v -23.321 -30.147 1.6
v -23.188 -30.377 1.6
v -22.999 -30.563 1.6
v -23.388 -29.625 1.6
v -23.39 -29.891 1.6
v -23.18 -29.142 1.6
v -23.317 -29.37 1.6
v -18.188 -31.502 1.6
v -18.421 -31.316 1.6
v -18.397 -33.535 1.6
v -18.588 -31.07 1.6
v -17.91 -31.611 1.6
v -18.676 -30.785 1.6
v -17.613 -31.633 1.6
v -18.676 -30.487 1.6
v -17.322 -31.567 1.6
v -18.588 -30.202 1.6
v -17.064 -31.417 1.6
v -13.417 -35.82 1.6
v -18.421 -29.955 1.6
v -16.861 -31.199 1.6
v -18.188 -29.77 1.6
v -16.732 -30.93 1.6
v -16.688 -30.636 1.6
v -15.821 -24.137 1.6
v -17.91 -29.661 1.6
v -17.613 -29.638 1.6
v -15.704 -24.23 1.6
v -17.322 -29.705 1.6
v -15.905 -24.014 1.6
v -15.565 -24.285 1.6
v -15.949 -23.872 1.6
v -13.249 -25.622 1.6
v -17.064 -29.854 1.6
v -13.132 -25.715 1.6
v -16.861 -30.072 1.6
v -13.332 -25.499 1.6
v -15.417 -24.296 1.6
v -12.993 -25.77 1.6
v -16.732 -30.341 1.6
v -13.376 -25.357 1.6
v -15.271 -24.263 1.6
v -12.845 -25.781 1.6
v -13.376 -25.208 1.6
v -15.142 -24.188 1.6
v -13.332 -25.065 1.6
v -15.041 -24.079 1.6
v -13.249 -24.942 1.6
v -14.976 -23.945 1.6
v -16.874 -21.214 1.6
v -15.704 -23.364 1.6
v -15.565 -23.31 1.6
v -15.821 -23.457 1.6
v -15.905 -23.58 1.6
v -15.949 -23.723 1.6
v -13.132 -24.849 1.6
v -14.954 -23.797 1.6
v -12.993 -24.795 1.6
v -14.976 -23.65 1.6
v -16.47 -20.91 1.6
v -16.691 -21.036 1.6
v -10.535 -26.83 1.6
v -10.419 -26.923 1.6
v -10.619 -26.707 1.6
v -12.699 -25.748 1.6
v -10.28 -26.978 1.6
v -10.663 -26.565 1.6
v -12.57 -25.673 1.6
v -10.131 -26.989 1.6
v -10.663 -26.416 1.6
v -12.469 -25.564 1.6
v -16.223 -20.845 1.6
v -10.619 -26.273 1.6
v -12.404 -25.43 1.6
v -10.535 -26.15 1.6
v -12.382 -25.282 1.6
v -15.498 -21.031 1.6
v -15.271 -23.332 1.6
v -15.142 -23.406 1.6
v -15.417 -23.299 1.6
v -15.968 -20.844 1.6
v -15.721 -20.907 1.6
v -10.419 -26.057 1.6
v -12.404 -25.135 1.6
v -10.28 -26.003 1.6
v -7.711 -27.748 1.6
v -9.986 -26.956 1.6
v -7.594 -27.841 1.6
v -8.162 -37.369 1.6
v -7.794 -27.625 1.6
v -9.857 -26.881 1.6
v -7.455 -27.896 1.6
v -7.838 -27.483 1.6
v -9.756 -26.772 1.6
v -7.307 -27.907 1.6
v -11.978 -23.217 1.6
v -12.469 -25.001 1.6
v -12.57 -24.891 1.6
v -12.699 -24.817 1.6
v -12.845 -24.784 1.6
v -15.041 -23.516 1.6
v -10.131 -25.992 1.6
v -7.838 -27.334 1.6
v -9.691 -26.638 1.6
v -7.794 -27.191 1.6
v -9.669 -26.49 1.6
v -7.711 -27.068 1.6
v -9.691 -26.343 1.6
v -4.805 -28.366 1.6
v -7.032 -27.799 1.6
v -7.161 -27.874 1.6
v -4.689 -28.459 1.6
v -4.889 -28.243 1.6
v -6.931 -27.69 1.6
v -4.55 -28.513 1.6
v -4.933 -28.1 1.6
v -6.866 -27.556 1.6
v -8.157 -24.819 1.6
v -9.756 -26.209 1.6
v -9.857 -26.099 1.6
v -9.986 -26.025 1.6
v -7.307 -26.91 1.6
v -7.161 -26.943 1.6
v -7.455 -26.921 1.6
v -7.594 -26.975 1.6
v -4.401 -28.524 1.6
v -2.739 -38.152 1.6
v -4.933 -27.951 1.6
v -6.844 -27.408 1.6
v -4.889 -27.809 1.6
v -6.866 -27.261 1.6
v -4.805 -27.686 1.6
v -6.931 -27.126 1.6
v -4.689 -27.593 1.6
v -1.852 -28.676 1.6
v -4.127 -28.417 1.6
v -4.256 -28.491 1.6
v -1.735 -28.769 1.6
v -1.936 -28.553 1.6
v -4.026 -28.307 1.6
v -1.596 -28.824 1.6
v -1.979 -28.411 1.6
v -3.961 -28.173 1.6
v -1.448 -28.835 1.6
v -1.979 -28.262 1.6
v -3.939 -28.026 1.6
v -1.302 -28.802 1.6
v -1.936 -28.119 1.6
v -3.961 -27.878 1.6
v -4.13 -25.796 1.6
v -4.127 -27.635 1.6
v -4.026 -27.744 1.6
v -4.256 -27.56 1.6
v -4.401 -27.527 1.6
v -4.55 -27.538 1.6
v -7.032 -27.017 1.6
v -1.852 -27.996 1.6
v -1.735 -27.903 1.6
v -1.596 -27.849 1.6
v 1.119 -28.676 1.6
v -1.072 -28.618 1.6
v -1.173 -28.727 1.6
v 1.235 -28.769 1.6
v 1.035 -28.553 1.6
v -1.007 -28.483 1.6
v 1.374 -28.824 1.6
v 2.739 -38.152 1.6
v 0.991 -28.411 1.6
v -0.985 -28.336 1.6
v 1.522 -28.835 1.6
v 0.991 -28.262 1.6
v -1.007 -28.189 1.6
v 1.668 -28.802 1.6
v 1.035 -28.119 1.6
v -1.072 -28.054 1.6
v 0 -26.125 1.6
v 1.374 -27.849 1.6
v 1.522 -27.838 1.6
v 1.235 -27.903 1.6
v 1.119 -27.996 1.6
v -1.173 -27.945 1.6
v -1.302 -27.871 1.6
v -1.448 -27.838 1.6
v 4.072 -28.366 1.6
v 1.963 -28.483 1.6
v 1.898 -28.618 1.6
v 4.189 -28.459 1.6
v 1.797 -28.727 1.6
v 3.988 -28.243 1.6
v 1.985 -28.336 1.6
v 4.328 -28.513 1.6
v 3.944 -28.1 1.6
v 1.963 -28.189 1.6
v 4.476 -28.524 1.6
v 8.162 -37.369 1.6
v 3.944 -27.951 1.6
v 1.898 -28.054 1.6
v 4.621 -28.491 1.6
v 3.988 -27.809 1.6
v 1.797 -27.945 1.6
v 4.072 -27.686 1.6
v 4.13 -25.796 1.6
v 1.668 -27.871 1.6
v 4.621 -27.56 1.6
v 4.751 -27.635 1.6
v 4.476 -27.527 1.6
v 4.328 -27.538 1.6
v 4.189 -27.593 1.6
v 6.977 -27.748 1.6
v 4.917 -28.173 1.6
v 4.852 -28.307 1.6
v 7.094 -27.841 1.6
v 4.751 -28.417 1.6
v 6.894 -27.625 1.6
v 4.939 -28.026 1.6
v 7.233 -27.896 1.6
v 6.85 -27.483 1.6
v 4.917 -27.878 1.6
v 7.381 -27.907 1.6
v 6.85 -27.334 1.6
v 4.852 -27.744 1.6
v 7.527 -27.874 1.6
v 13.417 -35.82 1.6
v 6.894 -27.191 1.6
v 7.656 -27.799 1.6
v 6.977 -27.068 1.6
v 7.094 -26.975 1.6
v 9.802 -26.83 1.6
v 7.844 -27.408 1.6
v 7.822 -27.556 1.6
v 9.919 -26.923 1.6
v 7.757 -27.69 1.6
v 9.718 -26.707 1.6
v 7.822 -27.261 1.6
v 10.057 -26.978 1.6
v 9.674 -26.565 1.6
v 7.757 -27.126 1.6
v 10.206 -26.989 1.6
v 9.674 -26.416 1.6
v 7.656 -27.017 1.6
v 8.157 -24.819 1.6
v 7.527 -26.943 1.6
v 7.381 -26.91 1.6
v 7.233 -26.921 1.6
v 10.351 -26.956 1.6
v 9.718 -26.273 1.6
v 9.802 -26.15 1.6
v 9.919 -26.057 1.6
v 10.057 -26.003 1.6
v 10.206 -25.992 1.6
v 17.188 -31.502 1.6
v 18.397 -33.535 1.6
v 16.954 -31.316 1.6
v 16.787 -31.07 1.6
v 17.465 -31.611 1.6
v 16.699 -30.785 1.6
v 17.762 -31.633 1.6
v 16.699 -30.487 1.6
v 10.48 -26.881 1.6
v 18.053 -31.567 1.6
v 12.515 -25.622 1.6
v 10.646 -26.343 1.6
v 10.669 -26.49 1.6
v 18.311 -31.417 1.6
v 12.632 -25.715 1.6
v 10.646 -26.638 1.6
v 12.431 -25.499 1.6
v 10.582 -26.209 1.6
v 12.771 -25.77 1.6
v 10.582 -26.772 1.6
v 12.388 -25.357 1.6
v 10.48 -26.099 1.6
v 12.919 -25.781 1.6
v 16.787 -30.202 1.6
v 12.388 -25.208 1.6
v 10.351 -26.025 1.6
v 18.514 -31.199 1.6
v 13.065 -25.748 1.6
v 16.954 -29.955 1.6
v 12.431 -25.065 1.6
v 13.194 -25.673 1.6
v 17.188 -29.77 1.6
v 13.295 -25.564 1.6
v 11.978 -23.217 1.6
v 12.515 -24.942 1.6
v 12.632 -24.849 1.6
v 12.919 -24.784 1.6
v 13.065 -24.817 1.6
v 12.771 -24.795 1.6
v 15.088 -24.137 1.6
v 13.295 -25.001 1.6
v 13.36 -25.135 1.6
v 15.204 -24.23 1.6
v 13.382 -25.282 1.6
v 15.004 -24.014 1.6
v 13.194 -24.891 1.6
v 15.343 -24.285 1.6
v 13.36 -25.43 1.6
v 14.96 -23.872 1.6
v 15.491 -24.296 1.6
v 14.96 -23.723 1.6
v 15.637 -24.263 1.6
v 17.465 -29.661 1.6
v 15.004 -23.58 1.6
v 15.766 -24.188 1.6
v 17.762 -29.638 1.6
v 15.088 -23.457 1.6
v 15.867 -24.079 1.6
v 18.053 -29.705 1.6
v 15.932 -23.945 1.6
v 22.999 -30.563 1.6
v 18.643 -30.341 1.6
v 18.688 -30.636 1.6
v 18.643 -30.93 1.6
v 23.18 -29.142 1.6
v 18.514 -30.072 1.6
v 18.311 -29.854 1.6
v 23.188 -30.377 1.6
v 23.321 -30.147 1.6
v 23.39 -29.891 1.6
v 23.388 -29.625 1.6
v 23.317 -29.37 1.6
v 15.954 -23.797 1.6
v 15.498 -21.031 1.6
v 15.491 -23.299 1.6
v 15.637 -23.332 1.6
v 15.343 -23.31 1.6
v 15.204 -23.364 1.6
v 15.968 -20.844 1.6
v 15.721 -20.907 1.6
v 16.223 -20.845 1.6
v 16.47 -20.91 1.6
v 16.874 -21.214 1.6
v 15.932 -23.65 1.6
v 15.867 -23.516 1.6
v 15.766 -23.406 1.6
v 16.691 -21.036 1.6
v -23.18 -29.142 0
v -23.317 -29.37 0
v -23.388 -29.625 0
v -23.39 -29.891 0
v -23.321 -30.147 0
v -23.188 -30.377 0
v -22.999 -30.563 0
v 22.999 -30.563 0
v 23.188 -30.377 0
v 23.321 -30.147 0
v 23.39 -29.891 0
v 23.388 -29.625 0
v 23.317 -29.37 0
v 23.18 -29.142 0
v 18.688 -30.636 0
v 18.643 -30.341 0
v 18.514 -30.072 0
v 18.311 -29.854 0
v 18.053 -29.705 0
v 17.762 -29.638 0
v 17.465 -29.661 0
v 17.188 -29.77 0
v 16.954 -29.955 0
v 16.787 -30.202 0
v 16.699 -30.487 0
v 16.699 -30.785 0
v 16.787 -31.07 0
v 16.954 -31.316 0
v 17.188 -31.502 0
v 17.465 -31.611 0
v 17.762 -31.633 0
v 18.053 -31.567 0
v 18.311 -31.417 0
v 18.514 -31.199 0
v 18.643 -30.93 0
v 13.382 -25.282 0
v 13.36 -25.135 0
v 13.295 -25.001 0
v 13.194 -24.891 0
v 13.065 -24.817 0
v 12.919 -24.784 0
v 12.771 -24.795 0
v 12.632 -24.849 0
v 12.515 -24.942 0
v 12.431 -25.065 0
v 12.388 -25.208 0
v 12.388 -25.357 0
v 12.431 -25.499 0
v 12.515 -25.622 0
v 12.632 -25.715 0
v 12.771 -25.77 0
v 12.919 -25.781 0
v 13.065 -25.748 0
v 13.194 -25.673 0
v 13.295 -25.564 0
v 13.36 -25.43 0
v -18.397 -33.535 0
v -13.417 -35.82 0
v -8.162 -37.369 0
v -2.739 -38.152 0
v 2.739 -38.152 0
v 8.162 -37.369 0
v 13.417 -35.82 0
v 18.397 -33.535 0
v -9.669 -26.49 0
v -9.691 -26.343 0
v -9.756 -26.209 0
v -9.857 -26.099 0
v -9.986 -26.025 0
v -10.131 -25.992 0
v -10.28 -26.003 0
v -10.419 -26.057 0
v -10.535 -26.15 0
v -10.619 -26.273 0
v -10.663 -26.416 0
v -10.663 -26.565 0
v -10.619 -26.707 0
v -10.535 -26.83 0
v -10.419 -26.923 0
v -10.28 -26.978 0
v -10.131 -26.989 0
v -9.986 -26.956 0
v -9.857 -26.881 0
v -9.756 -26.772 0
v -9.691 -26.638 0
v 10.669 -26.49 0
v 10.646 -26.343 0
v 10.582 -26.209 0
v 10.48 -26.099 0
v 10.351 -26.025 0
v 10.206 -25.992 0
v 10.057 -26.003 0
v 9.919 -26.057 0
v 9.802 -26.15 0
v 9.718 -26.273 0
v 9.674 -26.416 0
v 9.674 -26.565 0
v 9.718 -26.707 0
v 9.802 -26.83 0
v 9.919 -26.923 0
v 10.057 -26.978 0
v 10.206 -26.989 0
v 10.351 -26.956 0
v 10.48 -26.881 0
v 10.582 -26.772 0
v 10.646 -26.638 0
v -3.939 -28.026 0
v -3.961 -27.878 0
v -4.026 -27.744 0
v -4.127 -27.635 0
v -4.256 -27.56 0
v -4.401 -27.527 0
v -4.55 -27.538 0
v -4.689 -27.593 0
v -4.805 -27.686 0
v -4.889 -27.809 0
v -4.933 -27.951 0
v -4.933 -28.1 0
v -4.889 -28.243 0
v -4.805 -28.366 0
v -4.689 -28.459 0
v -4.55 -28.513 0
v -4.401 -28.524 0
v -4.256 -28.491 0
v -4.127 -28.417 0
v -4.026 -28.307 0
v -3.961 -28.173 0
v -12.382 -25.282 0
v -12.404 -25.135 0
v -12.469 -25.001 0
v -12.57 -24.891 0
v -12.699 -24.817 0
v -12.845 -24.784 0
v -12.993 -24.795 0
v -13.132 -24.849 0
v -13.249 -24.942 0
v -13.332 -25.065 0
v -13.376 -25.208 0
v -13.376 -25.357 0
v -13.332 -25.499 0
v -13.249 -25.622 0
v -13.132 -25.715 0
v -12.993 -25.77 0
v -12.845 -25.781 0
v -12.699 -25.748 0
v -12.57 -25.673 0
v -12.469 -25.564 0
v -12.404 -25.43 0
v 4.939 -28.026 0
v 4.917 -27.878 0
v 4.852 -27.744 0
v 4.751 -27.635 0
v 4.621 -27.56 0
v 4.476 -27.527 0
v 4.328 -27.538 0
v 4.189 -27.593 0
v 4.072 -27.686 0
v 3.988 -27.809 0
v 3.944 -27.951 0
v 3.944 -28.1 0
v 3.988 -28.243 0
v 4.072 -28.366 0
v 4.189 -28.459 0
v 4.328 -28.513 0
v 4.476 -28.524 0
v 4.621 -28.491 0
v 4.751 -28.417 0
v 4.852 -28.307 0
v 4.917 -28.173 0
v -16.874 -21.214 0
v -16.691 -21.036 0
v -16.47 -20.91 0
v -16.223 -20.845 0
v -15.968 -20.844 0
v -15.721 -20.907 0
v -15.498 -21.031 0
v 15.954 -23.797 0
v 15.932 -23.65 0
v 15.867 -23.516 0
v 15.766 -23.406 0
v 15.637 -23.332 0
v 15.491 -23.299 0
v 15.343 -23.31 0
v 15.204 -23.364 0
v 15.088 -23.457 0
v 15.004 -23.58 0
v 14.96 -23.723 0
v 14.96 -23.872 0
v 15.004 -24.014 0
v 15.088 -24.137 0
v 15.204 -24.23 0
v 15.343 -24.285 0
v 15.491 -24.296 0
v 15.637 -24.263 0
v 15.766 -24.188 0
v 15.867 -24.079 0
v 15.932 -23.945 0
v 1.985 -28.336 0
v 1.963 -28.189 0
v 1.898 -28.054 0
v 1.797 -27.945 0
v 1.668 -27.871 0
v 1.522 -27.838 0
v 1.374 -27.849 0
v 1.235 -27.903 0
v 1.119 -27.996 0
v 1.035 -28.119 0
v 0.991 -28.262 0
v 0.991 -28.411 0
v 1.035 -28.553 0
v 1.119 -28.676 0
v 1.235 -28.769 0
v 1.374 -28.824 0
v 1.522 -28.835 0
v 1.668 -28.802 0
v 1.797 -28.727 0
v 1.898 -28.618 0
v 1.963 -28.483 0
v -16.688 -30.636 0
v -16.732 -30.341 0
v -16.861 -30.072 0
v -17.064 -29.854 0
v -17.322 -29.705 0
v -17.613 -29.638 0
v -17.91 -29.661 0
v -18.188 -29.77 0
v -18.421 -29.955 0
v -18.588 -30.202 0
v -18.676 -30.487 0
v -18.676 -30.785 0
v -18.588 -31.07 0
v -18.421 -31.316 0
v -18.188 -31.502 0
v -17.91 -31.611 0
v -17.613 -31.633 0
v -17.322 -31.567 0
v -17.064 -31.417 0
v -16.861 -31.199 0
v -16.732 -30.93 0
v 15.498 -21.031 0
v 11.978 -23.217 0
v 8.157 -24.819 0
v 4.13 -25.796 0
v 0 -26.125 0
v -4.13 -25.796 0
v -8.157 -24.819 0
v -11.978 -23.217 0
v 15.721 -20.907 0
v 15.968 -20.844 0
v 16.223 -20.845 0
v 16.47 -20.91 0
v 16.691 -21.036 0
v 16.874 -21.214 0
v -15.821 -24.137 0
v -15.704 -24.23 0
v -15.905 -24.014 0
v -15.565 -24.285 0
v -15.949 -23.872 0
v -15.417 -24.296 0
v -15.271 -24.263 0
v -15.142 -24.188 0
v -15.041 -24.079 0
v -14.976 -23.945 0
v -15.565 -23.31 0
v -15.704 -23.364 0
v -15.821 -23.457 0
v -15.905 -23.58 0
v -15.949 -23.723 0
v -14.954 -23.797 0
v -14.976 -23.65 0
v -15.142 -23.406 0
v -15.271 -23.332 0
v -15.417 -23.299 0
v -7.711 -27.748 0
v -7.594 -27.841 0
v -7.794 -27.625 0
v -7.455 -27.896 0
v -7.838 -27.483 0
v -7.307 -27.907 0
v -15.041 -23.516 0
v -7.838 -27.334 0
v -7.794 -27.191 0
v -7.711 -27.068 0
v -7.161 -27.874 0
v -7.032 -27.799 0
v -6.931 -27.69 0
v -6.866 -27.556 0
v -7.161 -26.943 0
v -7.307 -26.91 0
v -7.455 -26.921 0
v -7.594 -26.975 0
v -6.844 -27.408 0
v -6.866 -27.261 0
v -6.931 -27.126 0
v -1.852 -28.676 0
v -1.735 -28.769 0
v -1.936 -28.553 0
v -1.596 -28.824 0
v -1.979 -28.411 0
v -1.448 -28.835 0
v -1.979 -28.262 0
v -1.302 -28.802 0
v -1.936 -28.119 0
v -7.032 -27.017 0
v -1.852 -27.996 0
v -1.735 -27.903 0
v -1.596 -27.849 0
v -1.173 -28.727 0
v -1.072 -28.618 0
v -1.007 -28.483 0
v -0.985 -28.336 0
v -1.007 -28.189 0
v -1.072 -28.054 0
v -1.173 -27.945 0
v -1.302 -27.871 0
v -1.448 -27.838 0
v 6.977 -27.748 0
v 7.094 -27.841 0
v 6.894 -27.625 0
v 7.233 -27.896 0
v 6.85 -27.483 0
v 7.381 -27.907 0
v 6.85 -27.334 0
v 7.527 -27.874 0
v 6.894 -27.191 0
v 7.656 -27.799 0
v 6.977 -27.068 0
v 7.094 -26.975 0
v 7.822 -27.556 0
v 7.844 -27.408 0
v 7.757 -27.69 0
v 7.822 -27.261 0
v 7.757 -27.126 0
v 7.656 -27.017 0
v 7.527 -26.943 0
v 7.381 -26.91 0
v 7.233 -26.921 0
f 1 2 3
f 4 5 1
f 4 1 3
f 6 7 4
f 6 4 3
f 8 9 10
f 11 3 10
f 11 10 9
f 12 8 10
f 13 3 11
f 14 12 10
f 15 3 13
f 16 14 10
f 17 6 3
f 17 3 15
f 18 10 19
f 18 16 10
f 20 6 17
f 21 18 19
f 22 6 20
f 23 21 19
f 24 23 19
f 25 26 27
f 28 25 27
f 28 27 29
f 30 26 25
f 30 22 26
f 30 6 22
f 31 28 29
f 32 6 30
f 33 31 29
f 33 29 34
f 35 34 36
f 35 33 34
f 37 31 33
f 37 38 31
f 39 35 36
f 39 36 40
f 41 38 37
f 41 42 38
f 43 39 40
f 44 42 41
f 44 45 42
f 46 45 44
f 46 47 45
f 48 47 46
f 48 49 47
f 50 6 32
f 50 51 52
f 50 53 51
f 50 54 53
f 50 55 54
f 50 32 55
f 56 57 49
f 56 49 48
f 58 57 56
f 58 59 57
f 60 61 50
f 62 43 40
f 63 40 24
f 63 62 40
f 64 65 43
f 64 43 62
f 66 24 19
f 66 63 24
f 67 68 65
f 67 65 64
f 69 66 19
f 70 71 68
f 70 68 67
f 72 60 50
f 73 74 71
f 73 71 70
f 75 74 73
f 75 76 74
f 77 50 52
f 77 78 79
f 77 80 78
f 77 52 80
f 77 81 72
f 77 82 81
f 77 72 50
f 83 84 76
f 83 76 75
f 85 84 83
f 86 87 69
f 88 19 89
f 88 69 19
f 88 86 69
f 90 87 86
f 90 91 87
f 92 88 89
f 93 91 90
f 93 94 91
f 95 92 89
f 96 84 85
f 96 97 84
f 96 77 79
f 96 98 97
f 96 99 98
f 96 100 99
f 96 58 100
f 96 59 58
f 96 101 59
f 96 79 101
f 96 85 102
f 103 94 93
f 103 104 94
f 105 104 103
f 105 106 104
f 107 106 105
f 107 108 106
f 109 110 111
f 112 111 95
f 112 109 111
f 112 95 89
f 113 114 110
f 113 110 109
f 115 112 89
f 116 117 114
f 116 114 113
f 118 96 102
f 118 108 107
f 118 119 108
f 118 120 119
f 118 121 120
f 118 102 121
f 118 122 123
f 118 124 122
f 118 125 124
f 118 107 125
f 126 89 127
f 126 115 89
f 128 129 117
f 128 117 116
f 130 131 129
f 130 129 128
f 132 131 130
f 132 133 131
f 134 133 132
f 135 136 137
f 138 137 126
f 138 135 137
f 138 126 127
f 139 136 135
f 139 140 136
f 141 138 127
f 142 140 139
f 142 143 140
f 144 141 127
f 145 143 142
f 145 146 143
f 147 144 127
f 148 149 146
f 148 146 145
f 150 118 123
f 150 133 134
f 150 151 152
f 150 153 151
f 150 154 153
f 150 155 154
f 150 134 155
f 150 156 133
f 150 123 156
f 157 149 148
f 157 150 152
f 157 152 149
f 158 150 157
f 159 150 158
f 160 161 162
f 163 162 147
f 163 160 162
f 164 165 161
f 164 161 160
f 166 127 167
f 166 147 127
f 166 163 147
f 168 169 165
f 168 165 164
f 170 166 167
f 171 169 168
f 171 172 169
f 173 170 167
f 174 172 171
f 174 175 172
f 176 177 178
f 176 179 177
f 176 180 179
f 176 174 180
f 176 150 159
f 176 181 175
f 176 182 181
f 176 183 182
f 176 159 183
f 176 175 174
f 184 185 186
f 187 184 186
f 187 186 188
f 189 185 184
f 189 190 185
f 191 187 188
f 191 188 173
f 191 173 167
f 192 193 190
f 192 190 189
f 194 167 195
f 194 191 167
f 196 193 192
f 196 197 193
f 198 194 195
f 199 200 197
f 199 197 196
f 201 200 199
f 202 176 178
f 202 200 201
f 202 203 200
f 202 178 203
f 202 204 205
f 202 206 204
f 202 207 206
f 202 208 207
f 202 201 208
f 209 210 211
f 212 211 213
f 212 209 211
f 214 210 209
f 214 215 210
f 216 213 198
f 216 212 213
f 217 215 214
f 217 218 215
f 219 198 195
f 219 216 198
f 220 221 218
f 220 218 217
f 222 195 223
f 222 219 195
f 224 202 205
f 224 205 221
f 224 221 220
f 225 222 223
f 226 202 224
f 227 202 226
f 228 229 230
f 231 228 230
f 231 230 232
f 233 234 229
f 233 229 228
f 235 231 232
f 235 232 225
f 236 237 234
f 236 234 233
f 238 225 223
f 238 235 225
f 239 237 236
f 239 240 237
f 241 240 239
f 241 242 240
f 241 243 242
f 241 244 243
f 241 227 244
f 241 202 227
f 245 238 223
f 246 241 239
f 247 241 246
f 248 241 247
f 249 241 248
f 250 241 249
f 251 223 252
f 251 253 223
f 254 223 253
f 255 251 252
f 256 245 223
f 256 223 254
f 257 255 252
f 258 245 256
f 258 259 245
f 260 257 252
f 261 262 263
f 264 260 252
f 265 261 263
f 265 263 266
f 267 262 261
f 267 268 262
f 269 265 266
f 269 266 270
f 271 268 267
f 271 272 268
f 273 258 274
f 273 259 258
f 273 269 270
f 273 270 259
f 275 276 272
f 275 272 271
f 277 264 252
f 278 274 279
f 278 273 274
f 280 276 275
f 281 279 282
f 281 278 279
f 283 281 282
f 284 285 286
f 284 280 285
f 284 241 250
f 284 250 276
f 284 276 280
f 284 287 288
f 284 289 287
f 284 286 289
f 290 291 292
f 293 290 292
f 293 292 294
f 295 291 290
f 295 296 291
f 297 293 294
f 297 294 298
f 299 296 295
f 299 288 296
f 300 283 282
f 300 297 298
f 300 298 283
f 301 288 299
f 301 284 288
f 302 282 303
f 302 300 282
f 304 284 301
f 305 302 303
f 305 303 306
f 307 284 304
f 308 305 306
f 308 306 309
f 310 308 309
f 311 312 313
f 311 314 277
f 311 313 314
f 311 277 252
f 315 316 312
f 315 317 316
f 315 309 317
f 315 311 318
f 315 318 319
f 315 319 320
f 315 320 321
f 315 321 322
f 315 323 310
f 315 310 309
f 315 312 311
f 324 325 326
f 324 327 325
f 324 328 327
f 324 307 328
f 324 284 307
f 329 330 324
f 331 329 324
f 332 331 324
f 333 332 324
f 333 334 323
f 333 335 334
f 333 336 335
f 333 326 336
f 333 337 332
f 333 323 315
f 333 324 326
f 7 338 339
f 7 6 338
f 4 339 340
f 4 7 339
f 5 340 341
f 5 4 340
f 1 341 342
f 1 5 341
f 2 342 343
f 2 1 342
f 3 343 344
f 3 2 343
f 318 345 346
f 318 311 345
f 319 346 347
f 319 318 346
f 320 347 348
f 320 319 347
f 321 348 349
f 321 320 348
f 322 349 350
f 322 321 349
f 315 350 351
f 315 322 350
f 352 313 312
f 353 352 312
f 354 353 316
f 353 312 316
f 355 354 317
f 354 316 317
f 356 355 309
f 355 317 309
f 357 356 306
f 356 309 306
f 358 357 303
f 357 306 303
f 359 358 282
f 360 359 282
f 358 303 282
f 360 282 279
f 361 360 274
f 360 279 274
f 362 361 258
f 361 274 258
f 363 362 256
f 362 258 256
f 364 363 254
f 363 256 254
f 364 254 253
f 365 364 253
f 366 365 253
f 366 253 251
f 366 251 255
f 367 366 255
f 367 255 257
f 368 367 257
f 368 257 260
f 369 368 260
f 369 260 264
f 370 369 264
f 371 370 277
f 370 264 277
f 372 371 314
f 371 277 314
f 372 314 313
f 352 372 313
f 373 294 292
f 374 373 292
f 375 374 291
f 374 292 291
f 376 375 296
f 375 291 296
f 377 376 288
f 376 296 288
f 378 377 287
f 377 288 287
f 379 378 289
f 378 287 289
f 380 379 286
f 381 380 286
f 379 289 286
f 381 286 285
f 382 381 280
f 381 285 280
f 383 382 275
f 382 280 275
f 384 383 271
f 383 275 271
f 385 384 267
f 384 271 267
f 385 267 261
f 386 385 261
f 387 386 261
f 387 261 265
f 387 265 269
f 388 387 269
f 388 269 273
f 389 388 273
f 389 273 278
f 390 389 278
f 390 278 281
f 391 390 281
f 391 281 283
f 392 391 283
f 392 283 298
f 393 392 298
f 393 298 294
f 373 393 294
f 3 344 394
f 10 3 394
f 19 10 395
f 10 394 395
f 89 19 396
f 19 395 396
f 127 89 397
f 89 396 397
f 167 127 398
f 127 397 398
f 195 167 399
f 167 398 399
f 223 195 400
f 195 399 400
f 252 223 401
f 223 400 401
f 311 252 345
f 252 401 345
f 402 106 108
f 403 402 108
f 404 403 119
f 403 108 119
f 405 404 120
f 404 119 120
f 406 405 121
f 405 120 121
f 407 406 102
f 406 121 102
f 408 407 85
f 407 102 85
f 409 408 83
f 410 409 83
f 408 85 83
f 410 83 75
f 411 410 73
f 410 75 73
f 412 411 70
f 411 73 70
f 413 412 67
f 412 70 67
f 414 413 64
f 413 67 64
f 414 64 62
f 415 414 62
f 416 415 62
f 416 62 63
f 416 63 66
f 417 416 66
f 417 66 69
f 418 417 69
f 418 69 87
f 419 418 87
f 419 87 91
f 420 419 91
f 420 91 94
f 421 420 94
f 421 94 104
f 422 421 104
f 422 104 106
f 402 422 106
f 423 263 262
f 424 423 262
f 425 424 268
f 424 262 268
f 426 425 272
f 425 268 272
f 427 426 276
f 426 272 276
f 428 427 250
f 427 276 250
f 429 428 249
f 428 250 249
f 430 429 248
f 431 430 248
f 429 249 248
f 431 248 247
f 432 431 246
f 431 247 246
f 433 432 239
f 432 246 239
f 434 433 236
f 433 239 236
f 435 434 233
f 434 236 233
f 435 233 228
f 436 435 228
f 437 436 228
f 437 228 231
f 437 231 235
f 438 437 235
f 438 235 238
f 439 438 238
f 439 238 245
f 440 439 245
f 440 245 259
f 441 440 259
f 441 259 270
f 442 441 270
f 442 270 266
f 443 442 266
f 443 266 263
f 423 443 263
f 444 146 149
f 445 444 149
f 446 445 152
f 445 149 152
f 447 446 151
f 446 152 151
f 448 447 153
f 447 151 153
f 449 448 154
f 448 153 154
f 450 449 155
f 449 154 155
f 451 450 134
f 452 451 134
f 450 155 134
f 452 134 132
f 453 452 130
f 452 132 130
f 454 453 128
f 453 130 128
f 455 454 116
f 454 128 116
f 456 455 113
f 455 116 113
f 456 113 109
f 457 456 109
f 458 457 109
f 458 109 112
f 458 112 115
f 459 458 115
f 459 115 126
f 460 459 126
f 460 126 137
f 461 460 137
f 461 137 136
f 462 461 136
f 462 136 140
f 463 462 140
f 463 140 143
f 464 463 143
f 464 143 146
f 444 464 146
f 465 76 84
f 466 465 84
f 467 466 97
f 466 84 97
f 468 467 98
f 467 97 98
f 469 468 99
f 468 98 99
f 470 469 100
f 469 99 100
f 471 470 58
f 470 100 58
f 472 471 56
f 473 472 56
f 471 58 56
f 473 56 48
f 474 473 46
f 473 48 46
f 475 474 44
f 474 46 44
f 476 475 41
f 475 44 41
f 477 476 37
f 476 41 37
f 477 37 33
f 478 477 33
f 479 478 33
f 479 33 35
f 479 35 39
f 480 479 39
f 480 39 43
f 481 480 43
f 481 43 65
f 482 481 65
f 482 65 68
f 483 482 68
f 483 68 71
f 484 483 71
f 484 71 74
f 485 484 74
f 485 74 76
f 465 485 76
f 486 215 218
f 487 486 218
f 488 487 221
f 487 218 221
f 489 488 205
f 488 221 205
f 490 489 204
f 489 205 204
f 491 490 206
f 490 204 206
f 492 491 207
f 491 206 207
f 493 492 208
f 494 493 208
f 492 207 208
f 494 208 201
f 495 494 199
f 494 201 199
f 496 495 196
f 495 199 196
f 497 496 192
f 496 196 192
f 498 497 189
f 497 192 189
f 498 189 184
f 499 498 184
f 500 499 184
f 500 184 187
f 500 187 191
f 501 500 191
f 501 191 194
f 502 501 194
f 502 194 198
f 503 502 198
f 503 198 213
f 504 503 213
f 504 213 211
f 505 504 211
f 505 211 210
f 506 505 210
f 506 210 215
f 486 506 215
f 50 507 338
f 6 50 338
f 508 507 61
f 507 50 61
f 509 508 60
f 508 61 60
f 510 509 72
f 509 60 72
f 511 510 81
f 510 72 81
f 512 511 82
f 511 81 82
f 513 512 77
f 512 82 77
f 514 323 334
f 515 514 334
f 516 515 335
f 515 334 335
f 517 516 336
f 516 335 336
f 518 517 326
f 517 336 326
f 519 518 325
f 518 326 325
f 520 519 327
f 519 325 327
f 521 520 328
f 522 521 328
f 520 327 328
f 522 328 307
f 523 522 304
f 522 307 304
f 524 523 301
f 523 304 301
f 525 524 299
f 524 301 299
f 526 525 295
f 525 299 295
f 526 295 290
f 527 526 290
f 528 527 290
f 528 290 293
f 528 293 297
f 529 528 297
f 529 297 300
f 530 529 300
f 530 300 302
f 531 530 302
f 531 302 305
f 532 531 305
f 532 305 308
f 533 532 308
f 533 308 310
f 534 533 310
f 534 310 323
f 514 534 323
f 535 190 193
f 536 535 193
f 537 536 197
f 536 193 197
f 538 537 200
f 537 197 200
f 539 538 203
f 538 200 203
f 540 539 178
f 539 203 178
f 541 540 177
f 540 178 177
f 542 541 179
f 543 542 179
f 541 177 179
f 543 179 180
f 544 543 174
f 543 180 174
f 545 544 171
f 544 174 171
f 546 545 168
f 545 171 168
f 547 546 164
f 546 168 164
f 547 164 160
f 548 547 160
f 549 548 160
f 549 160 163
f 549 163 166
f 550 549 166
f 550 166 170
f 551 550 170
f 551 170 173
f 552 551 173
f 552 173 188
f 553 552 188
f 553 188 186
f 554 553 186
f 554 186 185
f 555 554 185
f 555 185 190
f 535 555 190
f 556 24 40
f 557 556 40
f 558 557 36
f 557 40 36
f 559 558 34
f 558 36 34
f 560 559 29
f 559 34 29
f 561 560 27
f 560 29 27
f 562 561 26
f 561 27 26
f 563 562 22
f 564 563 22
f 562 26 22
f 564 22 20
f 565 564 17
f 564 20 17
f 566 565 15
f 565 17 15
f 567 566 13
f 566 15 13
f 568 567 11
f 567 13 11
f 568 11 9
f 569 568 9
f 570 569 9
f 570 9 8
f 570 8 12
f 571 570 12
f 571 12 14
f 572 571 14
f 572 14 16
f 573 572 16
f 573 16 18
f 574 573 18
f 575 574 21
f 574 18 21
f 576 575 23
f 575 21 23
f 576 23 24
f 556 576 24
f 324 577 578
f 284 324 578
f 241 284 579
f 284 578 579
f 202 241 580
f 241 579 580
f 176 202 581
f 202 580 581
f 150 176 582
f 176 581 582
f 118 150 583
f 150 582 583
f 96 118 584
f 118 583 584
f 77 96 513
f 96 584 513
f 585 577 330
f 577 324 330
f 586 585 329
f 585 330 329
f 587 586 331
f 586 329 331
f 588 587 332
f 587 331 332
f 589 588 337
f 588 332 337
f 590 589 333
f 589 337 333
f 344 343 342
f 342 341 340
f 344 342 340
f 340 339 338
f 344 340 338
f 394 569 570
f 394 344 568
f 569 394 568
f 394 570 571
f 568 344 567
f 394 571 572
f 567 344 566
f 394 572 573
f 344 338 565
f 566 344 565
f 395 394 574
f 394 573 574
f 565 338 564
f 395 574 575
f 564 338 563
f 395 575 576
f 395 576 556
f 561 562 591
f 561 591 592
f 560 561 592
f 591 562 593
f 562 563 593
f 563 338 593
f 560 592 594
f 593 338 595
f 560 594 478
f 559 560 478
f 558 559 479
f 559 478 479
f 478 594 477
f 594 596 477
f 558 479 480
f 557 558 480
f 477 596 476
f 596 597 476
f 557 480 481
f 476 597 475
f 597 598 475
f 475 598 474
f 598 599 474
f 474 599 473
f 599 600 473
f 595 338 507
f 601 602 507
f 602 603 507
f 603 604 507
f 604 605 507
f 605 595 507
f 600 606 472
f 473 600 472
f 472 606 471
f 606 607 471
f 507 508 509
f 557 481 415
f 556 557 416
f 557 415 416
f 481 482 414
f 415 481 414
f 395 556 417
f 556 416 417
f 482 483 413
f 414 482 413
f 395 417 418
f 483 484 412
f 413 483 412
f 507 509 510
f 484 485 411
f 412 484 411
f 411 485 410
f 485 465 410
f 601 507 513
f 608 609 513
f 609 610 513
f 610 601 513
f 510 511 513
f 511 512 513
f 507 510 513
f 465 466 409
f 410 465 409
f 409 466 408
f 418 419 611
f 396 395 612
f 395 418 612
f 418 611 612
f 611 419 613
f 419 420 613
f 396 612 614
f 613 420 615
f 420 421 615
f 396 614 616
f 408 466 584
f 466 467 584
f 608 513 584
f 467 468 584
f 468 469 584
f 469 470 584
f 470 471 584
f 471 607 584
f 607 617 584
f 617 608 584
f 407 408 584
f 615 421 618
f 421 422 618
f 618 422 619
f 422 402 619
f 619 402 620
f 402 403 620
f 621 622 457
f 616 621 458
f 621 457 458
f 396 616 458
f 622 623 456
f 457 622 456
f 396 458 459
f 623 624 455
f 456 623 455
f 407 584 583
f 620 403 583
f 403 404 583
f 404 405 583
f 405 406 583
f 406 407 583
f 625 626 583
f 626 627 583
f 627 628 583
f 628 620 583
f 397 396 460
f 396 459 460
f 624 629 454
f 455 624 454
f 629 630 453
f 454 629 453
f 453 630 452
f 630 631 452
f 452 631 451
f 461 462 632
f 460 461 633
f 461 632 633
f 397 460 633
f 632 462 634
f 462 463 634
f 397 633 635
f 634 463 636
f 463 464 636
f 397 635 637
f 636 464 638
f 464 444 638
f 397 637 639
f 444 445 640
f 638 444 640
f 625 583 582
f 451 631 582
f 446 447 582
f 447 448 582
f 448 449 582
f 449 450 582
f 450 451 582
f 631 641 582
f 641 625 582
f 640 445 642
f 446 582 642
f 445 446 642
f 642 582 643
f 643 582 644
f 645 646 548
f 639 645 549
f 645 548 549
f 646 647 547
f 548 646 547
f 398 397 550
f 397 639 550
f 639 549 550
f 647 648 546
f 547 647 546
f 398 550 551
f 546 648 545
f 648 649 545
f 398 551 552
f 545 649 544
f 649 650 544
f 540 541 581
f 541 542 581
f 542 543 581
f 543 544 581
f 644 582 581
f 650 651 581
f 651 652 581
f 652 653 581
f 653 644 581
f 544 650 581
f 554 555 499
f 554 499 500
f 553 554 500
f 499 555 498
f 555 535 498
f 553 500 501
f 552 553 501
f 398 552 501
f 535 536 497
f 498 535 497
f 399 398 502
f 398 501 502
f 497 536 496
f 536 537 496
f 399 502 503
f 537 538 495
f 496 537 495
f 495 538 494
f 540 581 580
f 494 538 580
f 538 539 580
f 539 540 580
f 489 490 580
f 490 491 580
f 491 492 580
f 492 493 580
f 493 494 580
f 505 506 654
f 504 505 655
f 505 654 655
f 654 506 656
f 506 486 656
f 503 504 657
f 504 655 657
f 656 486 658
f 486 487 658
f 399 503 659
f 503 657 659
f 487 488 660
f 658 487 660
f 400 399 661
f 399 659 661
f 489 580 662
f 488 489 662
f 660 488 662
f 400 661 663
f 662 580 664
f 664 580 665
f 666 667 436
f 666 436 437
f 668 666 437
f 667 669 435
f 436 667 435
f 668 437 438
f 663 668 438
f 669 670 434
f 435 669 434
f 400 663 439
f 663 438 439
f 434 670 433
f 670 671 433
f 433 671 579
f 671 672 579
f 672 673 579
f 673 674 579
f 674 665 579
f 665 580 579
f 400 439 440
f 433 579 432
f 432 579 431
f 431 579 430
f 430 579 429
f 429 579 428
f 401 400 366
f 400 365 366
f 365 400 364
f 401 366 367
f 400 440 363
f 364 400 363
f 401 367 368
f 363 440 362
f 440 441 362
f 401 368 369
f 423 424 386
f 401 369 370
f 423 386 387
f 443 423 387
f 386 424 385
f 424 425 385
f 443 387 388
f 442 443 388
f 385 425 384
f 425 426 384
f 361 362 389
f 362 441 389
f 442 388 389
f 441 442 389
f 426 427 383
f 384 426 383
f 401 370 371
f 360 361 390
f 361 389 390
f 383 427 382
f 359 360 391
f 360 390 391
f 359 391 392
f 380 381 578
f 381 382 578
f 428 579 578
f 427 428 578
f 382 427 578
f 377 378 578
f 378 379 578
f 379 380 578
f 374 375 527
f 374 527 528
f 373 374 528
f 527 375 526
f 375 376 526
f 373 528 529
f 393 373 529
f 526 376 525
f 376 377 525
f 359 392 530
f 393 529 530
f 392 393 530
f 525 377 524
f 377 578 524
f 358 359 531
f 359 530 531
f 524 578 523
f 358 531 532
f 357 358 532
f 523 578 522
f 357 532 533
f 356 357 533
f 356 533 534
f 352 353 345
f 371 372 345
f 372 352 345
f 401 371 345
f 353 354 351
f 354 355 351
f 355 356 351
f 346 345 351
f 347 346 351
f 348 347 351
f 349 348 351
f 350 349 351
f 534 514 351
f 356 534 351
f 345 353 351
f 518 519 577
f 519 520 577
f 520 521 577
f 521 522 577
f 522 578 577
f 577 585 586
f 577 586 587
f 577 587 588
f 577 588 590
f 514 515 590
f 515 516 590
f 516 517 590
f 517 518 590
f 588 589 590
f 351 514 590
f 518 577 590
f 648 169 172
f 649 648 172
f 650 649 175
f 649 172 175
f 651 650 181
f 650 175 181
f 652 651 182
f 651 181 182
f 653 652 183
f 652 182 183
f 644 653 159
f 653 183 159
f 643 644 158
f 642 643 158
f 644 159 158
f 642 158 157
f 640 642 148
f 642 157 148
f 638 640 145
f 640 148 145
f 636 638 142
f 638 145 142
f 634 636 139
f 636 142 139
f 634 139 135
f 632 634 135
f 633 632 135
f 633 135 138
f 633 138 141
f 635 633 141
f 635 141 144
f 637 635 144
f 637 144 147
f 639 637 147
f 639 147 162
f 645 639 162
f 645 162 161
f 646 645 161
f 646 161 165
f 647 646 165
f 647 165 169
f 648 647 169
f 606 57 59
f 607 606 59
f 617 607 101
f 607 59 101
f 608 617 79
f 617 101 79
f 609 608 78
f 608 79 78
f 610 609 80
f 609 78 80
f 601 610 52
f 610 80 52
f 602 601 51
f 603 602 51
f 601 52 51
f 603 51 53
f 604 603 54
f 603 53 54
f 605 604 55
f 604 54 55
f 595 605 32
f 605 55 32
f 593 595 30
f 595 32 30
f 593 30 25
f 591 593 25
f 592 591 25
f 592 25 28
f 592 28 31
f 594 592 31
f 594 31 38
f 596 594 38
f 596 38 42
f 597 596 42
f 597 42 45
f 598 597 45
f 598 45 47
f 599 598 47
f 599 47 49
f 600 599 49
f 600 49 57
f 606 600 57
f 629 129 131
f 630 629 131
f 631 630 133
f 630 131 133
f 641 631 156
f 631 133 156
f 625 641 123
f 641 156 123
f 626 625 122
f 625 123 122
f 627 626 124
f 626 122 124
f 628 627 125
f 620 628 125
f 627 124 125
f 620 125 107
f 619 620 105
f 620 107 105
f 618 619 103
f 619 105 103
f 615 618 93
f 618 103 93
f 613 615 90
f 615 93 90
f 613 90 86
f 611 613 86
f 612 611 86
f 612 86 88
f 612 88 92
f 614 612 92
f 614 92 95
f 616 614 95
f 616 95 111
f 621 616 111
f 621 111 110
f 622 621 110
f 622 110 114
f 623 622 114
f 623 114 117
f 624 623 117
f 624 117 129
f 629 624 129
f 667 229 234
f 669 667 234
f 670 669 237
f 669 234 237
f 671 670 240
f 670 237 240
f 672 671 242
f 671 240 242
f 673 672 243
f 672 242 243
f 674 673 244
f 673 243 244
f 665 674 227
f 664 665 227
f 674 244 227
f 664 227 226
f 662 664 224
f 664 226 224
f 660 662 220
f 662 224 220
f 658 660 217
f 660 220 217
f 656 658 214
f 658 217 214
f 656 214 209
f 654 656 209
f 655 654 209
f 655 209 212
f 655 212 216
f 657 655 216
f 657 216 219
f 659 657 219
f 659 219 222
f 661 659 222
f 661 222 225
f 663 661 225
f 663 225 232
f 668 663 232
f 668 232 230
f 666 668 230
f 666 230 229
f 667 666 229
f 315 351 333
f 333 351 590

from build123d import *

# Parameters (mm, degrees)
BOSS_EXTRUDE2_DEPTH = 1.6
CUT_EXTRUDE3_START  = 1.6
SKETCH1_R           = 0.5
CUT_EXTRUDE3_DEPTH  = 47.684310176
CUT_EXTRUDE4_START  = 1.6
SKETCH3_R           = 1
CUT_EXTRUDE4_DEPTH  = 1.6
FILLET1_R           = 1


with BuildPart() as part:
    # Sketch2 → Boss-Extrude2 (new body)
    with BuildSketch(Plane.XY):
        with BuildLine():
            Line((-16.263194882, -20.445638098), (-23.811184851, -29.934762))
            ThreePointArc((-23.811184851, -29.934762), (0, -38.25), (23.811184851, -29.934762))
            Line((23.811184851, -29.934762), (16.263194882, -20.445638098))
            ThreePointArc((16.263194882, -20.445638098), (0, -26.125), (-16.263194882, -20.445638098))
        make_face()
    extrude(amount=BOSS_EXTRUDE2_DEPTH)

    # Sketch1 → Cut-Extrude3 (cut, through all)
    with BuildSketch(Plane.XY.offset(CUT_EXTRUDE3_START)):
        with Locations((-15.454132619, -23.797277365)):
            Circle(SKETCH1_R)
        with Locations((-12.88198043, -25.282310124)):
            Circle(SKETCH1_R)
        with Locations((-10.168690568, -26.490344602)):
            Circle(SKETCH1_R)
        with Locations((-7.343990405, -27.408145321)):
            Circle(SKETCH1_R)
        with Locations((-4.438827946, -28.025656664)):
            Circle(SKETCH1_R)
        with Locations((-1.485032758, -28.336113049)):
            Circle(SKETCH1_R)
        with Locations((1.485032758, -28.336113049)):
            Circle(SKETCH1_R)
        with Locations((4.438827946, -28.025656664)):
            Circle(SKETCH1_R)
        with Locations((7.343990405, -27.408145321)):
            Circle(SKETCH1_R)
        with Locations((10.168690568, -26.490344602)):
            Circle(SKETCH1_R)
        with Locations((12.88198043, -25.282310124)):
            Circle(SKETCH1_R)
        with Locations((15.454132619, -23.797277365)):
            Circle(SKETCH1_R)
    extrude(amount=-CUT_EXTRUDE3_DEPTH, mode=Mode.SUBTRACT)

    # Sketch3 → Cut-Extrude4 (cut)
    with BuildSketch(Plane.XY.offset(CUT_EXTRUDE4_START)):
        with Locations((-17.6875, -30.635648659)):
            Circle(SKETCH3_R)
        with Locations((17.6875, -30.635648659)):
            Circle(SKETCH3_R)
    extrude(amount=-CUT_EXTRUDE4_DEPTH, mode=Mode.SUBTRACT)

    # Fillet1
    fillet1_edges = [part.edges().sort_by_distance(p)[0] for p in [
        (16.263194882, -20.445638098, 0.8),
        (23.811184851, -29.934762, 0.8),
        (-23.811184851, -29.934762, 0.8),
        (-16.263194882, -20.445638098, 0.8),
    ]]
    fillet(fillet1_edges, radius=FILLET1_R)


solid = part.part
